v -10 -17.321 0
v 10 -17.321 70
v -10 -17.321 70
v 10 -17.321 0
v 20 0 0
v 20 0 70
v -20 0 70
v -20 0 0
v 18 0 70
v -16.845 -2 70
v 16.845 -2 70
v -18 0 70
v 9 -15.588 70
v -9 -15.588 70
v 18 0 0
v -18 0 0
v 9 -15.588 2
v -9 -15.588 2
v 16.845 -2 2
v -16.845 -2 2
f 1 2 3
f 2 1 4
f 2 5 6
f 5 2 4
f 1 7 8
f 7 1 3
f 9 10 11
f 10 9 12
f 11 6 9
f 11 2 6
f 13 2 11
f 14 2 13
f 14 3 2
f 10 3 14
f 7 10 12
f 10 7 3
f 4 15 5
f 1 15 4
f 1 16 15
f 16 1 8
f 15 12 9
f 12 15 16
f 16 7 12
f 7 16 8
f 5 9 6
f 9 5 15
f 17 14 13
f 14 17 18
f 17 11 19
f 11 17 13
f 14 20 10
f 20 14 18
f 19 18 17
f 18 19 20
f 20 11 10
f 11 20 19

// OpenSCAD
module half_cylinder(h=10, d=10) {
    difference() {
        cylinder(h=h, d=d, $fn=6);
        translate([-(d / 2), 0, 0]) cube([d, d, h]);
    }
}

d=40;
h=70;
padding = 2;
dpad = d - padding*2;

difference() {
    half_cylinder(h=h, d=d);
    translate([0, 0, padding]) half_cylinder(h=h, d=dpad);
}

translate([-(dpad / 2), -padding, 0]) cube([dpad, padding, h]);
